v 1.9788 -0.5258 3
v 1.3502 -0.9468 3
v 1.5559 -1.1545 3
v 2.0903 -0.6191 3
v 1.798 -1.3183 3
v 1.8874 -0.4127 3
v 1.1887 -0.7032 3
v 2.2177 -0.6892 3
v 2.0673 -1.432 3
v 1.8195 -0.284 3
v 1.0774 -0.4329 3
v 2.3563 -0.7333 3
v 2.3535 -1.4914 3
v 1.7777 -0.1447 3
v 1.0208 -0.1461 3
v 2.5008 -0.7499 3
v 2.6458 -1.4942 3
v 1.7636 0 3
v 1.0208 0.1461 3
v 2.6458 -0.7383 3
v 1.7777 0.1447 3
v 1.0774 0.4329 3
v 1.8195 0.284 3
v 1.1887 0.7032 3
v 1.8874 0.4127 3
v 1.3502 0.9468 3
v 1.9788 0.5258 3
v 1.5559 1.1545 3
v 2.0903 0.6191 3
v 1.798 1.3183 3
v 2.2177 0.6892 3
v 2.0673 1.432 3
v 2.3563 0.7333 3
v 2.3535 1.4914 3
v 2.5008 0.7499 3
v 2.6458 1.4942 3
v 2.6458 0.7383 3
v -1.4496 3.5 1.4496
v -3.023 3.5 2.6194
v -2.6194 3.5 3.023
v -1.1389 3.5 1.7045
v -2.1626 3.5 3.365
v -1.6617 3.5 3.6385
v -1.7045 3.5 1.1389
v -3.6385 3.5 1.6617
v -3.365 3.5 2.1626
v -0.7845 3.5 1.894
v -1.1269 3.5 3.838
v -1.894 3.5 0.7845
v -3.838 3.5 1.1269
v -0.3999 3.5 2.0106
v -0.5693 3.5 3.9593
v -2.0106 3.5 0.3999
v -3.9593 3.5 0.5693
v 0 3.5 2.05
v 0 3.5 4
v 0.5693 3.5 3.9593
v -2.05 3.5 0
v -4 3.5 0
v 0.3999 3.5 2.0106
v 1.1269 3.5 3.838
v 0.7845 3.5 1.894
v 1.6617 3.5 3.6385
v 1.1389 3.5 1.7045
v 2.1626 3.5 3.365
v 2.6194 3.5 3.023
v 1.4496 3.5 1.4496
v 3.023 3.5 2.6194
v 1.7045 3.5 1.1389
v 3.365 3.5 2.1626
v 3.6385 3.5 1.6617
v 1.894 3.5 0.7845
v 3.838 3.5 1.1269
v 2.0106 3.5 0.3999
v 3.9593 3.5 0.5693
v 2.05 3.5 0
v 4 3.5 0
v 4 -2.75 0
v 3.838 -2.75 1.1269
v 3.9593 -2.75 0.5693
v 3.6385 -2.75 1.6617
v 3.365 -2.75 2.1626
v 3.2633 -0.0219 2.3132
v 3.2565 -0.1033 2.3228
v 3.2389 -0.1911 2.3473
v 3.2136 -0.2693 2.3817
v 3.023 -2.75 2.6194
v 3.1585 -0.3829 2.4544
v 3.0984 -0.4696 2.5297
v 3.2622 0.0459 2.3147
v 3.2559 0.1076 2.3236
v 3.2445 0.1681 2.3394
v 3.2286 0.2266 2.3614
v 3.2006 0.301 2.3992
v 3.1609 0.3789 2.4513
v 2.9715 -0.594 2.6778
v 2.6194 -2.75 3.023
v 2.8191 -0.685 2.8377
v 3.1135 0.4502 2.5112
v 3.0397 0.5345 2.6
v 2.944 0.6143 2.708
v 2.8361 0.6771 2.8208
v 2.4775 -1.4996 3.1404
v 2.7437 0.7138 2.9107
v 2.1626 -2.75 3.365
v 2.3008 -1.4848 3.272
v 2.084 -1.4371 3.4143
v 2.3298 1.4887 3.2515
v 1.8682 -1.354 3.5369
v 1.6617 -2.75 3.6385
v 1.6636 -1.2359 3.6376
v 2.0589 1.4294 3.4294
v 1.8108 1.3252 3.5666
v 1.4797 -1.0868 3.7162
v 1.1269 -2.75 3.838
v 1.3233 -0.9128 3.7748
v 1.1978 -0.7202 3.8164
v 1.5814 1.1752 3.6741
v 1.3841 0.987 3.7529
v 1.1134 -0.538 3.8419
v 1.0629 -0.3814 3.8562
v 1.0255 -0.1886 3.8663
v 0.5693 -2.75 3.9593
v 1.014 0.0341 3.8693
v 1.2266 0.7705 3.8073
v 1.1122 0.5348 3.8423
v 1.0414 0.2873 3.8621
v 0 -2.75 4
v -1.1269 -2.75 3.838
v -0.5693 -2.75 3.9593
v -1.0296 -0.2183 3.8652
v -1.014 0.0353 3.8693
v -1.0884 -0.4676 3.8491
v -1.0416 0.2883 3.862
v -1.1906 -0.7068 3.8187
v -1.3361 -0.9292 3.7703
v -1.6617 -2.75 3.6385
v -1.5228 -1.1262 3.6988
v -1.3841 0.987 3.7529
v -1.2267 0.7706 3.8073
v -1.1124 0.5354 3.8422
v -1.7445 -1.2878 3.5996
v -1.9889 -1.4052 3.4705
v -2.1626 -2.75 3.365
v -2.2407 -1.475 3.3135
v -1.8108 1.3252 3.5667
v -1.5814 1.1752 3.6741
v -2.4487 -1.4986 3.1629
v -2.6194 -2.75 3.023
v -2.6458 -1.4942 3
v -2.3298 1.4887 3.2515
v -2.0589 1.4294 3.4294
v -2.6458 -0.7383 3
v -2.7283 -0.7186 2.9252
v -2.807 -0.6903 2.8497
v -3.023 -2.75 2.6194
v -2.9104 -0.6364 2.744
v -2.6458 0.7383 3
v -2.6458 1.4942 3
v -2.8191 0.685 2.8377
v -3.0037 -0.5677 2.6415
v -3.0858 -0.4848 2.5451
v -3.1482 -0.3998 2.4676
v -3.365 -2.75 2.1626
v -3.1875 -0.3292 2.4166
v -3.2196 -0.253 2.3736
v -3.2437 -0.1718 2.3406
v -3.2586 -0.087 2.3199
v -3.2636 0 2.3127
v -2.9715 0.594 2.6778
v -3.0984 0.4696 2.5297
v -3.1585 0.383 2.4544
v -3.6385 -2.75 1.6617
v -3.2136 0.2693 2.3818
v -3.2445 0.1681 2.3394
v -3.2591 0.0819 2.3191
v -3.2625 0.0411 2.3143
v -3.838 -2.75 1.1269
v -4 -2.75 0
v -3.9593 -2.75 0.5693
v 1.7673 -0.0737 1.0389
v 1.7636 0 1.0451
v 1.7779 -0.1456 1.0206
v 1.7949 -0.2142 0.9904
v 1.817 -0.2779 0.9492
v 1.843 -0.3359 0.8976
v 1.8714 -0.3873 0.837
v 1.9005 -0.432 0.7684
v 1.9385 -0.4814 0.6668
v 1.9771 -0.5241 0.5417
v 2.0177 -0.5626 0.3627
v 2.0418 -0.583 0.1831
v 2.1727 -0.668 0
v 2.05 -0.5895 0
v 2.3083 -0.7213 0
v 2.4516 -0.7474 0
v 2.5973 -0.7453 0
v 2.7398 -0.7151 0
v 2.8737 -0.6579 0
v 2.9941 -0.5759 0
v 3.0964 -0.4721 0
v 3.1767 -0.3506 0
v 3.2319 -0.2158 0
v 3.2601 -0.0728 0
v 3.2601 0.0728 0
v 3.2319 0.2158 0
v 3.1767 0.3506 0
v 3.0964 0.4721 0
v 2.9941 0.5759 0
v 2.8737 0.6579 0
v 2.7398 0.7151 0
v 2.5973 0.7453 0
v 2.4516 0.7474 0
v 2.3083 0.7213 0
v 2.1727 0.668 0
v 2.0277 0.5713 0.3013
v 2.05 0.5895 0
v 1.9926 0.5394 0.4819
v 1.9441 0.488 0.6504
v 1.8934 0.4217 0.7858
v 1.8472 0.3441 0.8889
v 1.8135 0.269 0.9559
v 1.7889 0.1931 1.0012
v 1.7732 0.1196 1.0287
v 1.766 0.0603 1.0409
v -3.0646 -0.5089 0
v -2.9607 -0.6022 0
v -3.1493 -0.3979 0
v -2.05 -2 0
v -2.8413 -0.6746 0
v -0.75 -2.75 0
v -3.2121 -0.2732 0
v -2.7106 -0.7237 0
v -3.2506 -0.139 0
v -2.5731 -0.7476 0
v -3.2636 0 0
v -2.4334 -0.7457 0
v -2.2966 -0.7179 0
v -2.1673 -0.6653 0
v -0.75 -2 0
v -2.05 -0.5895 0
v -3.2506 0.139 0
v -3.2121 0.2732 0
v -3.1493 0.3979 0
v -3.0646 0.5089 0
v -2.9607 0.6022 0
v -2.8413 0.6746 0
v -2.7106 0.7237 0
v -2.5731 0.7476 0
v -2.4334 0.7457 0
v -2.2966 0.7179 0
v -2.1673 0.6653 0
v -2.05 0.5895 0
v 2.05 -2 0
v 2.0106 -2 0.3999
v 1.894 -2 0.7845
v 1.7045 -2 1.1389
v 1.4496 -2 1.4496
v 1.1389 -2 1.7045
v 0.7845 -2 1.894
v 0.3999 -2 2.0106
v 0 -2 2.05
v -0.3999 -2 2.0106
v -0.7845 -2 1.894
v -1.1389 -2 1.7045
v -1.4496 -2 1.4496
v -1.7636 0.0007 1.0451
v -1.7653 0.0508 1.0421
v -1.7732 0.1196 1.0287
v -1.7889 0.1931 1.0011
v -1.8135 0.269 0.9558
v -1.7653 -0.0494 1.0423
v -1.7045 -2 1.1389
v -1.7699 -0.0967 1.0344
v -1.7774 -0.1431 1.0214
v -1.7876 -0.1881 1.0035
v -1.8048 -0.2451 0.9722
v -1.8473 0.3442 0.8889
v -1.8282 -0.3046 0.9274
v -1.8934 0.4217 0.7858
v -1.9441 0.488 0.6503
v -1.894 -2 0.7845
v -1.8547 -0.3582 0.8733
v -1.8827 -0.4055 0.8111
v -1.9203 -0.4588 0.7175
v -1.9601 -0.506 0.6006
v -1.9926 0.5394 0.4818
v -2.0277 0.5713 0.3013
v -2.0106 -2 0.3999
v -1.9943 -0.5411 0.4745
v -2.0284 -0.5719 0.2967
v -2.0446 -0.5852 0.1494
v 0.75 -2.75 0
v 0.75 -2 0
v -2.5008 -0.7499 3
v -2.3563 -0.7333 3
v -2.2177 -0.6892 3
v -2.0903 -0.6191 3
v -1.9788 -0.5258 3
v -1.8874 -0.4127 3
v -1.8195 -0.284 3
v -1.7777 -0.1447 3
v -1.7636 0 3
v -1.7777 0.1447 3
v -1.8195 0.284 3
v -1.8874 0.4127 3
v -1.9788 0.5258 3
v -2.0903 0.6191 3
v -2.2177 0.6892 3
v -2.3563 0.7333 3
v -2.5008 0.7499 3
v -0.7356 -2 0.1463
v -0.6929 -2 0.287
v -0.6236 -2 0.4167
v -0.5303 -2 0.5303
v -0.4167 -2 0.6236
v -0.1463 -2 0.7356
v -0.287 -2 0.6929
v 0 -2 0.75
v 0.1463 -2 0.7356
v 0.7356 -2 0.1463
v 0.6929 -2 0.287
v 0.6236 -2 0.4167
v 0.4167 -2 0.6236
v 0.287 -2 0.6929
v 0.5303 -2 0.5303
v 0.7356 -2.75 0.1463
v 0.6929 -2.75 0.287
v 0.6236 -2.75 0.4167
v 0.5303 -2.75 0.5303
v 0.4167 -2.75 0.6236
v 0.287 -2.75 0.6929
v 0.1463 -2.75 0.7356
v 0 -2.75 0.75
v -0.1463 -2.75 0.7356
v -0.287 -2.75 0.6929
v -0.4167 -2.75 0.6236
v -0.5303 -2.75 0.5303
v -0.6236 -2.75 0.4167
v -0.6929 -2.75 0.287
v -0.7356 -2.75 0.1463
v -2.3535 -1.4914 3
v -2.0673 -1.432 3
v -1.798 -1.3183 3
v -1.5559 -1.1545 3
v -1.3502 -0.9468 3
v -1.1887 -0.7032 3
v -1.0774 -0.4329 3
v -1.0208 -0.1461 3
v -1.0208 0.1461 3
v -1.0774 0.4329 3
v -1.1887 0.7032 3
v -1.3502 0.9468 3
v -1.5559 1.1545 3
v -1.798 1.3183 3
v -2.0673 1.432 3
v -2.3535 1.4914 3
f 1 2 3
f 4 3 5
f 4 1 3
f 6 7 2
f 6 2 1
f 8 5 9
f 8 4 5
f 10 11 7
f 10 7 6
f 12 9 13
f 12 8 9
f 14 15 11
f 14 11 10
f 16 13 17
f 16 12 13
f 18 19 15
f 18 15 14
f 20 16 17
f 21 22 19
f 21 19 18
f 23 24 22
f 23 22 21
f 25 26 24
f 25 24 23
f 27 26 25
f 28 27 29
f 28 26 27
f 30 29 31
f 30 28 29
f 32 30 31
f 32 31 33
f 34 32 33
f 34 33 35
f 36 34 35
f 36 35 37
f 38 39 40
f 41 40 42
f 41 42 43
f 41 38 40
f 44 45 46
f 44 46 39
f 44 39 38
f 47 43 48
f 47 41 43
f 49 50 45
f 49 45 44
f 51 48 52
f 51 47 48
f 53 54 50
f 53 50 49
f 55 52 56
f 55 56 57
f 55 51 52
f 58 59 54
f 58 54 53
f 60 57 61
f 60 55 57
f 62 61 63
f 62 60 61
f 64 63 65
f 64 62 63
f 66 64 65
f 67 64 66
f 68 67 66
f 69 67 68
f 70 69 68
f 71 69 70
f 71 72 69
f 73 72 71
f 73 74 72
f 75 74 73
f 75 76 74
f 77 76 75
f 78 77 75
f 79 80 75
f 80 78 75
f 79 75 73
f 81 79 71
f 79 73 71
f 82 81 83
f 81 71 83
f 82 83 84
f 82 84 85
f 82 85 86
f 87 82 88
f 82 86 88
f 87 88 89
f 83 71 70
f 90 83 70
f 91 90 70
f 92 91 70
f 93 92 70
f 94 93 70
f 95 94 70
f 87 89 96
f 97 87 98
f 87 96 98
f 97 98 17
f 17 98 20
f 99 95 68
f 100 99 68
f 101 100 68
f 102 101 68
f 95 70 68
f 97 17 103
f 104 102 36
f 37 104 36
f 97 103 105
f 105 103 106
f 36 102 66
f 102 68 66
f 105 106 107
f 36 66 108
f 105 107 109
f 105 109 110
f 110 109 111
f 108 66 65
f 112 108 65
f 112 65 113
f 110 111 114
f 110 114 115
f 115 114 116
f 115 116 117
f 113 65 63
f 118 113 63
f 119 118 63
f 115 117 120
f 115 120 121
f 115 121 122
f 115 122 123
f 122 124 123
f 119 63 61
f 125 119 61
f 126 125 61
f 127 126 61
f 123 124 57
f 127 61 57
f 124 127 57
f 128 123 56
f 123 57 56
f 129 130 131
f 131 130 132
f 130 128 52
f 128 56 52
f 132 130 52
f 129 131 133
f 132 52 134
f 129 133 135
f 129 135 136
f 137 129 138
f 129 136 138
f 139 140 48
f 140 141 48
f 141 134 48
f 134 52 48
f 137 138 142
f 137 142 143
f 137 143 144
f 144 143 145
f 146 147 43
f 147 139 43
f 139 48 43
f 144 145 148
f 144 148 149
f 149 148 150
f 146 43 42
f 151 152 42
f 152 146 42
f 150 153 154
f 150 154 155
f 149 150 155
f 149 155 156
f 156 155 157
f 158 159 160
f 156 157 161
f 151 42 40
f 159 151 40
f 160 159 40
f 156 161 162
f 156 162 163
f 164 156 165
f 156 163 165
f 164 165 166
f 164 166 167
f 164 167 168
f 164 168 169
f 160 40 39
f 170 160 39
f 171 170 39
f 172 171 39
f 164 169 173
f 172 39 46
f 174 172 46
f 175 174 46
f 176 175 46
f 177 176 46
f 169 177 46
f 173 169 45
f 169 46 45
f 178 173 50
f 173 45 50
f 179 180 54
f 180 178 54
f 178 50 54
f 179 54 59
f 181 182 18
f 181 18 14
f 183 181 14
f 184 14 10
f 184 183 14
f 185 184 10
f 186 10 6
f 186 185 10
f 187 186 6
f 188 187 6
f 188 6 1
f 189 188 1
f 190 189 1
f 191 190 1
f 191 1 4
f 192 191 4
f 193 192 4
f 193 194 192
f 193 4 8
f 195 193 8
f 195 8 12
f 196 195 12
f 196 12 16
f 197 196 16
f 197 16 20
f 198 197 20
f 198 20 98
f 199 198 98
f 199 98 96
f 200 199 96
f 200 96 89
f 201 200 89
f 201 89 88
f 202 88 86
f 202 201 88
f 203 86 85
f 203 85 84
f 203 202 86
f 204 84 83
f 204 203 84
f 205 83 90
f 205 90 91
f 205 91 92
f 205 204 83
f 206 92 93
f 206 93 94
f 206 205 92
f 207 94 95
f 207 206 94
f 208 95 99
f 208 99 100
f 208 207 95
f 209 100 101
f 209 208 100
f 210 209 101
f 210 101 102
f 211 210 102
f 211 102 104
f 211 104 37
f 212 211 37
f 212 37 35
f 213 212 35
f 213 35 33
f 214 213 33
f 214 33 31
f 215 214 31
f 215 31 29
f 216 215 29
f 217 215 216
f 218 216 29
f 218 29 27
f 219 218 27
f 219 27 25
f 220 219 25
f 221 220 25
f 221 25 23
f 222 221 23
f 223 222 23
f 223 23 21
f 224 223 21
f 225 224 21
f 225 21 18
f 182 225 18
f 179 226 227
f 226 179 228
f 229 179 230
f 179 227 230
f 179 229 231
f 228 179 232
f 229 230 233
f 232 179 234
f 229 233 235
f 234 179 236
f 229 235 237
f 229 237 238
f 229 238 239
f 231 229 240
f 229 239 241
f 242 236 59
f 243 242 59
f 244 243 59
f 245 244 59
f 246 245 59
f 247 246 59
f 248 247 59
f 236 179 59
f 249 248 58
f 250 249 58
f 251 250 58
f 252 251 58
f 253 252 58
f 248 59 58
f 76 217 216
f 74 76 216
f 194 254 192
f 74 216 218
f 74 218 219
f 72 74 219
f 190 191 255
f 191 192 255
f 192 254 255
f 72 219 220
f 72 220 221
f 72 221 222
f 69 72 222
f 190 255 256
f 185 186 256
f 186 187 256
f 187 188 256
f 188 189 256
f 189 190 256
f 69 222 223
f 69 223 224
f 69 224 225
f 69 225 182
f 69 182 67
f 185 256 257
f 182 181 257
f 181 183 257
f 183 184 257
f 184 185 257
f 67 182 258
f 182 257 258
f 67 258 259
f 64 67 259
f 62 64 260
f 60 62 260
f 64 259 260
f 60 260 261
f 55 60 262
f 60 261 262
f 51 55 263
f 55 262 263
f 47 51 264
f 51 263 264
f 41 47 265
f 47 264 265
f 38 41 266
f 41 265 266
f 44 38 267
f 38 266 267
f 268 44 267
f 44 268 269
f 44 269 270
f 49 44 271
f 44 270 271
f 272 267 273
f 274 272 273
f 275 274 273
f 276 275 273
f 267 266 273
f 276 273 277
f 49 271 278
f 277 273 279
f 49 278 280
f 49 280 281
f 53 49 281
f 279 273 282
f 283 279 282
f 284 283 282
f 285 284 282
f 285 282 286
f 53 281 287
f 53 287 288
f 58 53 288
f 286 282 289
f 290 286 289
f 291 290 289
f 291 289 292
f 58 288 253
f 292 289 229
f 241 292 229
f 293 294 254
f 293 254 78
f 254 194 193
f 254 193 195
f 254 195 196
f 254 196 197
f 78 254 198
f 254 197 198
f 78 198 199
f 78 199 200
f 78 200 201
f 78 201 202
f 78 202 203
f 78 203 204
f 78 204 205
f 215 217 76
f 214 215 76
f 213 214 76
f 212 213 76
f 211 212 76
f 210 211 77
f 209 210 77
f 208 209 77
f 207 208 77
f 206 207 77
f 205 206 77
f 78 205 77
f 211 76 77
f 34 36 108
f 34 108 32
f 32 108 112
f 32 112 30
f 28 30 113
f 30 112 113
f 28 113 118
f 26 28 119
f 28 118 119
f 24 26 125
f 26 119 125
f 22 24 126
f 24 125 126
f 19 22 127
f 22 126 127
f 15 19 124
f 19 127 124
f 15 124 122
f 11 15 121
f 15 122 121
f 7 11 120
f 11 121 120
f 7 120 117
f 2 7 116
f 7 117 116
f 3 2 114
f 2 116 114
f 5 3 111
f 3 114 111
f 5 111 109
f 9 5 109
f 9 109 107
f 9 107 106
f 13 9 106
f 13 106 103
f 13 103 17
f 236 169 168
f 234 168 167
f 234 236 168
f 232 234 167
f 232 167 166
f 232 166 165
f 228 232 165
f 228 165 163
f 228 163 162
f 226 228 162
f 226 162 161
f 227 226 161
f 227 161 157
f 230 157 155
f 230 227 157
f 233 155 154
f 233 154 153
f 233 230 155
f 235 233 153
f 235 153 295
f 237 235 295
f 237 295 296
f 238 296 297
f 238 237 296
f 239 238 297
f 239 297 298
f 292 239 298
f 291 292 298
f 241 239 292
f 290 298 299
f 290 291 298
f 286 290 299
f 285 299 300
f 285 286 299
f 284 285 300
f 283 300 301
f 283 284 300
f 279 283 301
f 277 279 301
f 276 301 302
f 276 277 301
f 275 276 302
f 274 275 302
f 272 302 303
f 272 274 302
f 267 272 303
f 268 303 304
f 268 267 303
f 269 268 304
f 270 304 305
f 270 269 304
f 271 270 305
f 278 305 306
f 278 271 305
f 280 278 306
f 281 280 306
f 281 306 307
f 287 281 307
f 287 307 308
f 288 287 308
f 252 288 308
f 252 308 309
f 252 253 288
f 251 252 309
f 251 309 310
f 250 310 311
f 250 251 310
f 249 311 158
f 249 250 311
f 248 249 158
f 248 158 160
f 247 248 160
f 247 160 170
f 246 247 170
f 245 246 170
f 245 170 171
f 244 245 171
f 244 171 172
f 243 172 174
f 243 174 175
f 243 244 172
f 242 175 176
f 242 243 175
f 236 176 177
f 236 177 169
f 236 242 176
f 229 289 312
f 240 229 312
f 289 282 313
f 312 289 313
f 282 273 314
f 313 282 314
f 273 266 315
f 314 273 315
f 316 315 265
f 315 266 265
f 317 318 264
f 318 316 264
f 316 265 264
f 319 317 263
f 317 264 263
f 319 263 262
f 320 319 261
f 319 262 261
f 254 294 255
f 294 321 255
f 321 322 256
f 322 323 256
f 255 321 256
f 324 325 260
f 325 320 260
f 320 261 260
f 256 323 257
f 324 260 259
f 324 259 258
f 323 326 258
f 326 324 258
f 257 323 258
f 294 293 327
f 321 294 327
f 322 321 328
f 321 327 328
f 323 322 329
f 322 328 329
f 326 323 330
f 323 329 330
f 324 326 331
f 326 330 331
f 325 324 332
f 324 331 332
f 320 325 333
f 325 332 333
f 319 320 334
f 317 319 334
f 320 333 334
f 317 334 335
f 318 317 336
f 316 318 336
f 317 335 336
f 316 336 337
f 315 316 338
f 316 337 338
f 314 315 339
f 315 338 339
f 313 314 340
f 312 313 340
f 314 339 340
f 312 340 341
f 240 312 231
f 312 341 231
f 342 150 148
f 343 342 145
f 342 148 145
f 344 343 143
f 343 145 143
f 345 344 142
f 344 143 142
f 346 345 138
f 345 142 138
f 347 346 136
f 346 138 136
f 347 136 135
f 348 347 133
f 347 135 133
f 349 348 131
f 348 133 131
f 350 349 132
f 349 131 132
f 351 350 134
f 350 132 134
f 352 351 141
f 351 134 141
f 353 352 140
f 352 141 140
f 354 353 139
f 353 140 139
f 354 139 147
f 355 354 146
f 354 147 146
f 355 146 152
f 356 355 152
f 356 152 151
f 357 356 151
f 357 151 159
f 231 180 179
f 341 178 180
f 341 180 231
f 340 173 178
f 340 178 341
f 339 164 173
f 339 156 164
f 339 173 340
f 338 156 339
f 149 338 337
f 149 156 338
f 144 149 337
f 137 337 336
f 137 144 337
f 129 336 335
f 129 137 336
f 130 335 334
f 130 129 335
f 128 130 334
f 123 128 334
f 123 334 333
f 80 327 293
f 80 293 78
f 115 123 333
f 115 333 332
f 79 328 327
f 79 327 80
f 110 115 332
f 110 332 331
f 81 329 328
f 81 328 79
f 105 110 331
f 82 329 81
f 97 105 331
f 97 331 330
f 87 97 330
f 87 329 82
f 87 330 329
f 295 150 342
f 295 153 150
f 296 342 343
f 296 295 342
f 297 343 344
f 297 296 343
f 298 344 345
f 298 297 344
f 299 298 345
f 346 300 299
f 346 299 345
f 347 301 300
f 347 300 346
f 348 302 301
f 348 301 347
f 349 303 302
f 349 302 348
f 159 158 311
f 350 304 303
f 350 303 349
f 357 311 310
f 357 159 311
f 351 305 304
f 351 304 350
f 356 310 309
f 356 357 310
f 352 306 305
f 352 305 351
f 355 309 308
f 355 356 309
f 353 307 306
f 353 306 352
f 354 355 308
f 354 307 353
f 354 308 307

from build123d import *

# Parameters (mm, degrees)
BOSS_EXTRUDE2_START     = 5.5
SKETCH8_R               = 2
BOSS_EXTRUDE2_DEPTH     = 5.5
SKETCH9_R               = 2.05
CUT_EXTRUDE3_DEPTH      = 5.5
CUT_EXTRUDE4_DEPTH      = 5.5
CUT_EXTRUDE4_DEPTH_BACK = 3
SKETCH10_R              = 0.75
SKETCH12_R              = 2.032145481
CUT_EXTRUDE5_DEPTH      = 1.2
CUT_EXTRUDE11_START     = -3
SKETCH15_R              = 1.5
CUT_EXTRUDE11_DEPTH     = 21.2
CUT_EXTRUDE12_START     = 24.2
SKETCH16_R              = 1.5
CUT_EXTRUDE12_DEPTH     = 21.2
SKETCH17_W              = 12.094428853
SKETCH17_H              = 12.59473796
CUT_EXTRUDE14_DEPTH     = 21.2
SKETCH18_R              = 5.596164195
CUT_EXTRUDE15_DEPTH     = 0.75


with BuildPart() as part:
    # Sketch1 → Revolve2 (revolve)
    with BuildSketch(Plane.XY):
        Polygon((-0.75, -3.5), (-0.75, -2), (-2, -2), (-2, 3.5), (-4, 3.5), (-4, -3.5), align=None)
        Polygon((2, -2), (0.75, -2), (0.75, -3.5), (4, -3.5), (4, 3.5), (2, 3.5), align=None)
    revolve(axis=Axis((0, 0, 0), (0, -1, 0)))

    # Sketch8 → Boss-Extrude2 (add)
    with BuildSketch(Plane(origin=(0, -2, 0), x_dir=(1, 0, 0), z_dir=(0, 1, 0)).offset(BOSS_EXTRUDE2_START)):
        Circle(SKETCH8_R)
    extrude(amount=-BOSS_EXTRUDE2_DEPTH)

    # Sketch9 → Cut-Extrude3 (cut)
    with BuildSketch(Plane.XZ.offset(2)):
        Circle(SKETCH9_R)
    extrude(amount=-CUT_EXTRUDE3_DEPTH, mode=Mode.SUBTRACT)

    # Sketch10 → Cut-Extrude4 (cut, two sides: drawn at the far end of the back side and taken through both)
    with BuildSketch(Plane.XY.offset(-CUT_EXTRUDE4_DEPTH_BACK)):
        with Locations(Location((2.513623539, 0, 0), (0, 0, 180))):
            Circle(SKETCH10_R)
        with Locations(Location((-2.513623539, 0, 0), (0, 0, 180))):
            Circle(SKETCH10_R)
    extrude(amount=CUT_EXTRUDE4_DEPTH + CUT_EXTRUDE4_DEPTH_BACK, mode=Mode.SUBTRACT)

    # Sketch12 → Cut-Extrude5 (cut)
    with BuildSketch(Plane(origin=(0, -2, 0), x_dir=(1, 0, 0), z_dir=(0, 1, 0))):
        Circle(SKETCH12_R)
    extrude(amount=CUT_EXTRUDE5_DEPTH, mode=Mode.SUBTRACT)

    # Sketch15 → Cut-Extrude11 (cut)
    with BuildSketch(Plane.XY.offset(CUT_EXTRUDE11_START)):
        with Locations((2.513623539, 0)):
            Circle(SKETCH15_R)
        with Locations((-2.513623539, 0)):
            Circle(SKETCH15_R)
    extrude(amount=-CUT_EXTRUDE11_DEPTH, mode=Mode.SUBTRACT)

    # Sketch16 → Cut-Extrude12 (cut)
    with BuildSketch(Plane.XY.offset(CUT_EXTRUDE12_START)):
        with Locations((2.513623539, 0)):
            Circle(SKETCH16_R)
        with Locations((-2.513623539, 0)):
            Circle(SKETCH16_R)
    extrude(amount=-CUT_EXTRUDE12_DEPTH, mode=Mode.SUBTRACT)

    # Sketch17 → Cut-Extrude14 (cut)
    with BuildSketch(Plane.XY):
        with Locations((-0.435051398, -0.913607935)):
            Rectangle(SKETCH17_W, SKETCH17_H)
    extrude(amount=-CUT_EXTRUDE14_DEPTH, mode=Mode.SUBTRACT)

    # Sketch18 → Cut-Extrude15 (cut)
    with BuildSketch(Plane.XZ.offset(3.5)):
        Circle(SKETCH18_R)
    extrude(amount=-CUT_EXTRUDE15_DEPTH, mode=Mode.SUBTRACT)


solid = part.part
